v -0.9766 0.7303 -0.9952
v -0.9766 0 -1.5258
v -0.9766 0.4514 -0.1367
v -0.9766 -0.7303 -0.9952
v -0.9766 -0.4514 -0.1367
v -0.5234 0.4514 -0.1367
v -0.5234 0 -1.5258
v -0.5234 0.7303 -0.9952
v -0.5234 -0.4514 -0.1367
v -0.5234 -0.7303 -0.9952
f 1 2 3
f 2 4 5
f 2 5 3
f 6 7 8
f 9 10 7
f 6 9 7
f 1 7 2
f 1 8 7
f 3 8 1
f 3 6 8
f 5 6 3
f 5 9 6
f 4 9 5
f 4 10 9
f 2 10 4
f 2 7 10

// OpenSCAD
EPS = 0.01;

translate([-0.75, 0, 0])
rotate([0, 90, 0])
translate([0, 0, -0.453125/2])
linear_extrude(height=0.453125)
    translate([0.7578947368421053, 0])
    circle(r=0.7578947368421053 + EPS);
